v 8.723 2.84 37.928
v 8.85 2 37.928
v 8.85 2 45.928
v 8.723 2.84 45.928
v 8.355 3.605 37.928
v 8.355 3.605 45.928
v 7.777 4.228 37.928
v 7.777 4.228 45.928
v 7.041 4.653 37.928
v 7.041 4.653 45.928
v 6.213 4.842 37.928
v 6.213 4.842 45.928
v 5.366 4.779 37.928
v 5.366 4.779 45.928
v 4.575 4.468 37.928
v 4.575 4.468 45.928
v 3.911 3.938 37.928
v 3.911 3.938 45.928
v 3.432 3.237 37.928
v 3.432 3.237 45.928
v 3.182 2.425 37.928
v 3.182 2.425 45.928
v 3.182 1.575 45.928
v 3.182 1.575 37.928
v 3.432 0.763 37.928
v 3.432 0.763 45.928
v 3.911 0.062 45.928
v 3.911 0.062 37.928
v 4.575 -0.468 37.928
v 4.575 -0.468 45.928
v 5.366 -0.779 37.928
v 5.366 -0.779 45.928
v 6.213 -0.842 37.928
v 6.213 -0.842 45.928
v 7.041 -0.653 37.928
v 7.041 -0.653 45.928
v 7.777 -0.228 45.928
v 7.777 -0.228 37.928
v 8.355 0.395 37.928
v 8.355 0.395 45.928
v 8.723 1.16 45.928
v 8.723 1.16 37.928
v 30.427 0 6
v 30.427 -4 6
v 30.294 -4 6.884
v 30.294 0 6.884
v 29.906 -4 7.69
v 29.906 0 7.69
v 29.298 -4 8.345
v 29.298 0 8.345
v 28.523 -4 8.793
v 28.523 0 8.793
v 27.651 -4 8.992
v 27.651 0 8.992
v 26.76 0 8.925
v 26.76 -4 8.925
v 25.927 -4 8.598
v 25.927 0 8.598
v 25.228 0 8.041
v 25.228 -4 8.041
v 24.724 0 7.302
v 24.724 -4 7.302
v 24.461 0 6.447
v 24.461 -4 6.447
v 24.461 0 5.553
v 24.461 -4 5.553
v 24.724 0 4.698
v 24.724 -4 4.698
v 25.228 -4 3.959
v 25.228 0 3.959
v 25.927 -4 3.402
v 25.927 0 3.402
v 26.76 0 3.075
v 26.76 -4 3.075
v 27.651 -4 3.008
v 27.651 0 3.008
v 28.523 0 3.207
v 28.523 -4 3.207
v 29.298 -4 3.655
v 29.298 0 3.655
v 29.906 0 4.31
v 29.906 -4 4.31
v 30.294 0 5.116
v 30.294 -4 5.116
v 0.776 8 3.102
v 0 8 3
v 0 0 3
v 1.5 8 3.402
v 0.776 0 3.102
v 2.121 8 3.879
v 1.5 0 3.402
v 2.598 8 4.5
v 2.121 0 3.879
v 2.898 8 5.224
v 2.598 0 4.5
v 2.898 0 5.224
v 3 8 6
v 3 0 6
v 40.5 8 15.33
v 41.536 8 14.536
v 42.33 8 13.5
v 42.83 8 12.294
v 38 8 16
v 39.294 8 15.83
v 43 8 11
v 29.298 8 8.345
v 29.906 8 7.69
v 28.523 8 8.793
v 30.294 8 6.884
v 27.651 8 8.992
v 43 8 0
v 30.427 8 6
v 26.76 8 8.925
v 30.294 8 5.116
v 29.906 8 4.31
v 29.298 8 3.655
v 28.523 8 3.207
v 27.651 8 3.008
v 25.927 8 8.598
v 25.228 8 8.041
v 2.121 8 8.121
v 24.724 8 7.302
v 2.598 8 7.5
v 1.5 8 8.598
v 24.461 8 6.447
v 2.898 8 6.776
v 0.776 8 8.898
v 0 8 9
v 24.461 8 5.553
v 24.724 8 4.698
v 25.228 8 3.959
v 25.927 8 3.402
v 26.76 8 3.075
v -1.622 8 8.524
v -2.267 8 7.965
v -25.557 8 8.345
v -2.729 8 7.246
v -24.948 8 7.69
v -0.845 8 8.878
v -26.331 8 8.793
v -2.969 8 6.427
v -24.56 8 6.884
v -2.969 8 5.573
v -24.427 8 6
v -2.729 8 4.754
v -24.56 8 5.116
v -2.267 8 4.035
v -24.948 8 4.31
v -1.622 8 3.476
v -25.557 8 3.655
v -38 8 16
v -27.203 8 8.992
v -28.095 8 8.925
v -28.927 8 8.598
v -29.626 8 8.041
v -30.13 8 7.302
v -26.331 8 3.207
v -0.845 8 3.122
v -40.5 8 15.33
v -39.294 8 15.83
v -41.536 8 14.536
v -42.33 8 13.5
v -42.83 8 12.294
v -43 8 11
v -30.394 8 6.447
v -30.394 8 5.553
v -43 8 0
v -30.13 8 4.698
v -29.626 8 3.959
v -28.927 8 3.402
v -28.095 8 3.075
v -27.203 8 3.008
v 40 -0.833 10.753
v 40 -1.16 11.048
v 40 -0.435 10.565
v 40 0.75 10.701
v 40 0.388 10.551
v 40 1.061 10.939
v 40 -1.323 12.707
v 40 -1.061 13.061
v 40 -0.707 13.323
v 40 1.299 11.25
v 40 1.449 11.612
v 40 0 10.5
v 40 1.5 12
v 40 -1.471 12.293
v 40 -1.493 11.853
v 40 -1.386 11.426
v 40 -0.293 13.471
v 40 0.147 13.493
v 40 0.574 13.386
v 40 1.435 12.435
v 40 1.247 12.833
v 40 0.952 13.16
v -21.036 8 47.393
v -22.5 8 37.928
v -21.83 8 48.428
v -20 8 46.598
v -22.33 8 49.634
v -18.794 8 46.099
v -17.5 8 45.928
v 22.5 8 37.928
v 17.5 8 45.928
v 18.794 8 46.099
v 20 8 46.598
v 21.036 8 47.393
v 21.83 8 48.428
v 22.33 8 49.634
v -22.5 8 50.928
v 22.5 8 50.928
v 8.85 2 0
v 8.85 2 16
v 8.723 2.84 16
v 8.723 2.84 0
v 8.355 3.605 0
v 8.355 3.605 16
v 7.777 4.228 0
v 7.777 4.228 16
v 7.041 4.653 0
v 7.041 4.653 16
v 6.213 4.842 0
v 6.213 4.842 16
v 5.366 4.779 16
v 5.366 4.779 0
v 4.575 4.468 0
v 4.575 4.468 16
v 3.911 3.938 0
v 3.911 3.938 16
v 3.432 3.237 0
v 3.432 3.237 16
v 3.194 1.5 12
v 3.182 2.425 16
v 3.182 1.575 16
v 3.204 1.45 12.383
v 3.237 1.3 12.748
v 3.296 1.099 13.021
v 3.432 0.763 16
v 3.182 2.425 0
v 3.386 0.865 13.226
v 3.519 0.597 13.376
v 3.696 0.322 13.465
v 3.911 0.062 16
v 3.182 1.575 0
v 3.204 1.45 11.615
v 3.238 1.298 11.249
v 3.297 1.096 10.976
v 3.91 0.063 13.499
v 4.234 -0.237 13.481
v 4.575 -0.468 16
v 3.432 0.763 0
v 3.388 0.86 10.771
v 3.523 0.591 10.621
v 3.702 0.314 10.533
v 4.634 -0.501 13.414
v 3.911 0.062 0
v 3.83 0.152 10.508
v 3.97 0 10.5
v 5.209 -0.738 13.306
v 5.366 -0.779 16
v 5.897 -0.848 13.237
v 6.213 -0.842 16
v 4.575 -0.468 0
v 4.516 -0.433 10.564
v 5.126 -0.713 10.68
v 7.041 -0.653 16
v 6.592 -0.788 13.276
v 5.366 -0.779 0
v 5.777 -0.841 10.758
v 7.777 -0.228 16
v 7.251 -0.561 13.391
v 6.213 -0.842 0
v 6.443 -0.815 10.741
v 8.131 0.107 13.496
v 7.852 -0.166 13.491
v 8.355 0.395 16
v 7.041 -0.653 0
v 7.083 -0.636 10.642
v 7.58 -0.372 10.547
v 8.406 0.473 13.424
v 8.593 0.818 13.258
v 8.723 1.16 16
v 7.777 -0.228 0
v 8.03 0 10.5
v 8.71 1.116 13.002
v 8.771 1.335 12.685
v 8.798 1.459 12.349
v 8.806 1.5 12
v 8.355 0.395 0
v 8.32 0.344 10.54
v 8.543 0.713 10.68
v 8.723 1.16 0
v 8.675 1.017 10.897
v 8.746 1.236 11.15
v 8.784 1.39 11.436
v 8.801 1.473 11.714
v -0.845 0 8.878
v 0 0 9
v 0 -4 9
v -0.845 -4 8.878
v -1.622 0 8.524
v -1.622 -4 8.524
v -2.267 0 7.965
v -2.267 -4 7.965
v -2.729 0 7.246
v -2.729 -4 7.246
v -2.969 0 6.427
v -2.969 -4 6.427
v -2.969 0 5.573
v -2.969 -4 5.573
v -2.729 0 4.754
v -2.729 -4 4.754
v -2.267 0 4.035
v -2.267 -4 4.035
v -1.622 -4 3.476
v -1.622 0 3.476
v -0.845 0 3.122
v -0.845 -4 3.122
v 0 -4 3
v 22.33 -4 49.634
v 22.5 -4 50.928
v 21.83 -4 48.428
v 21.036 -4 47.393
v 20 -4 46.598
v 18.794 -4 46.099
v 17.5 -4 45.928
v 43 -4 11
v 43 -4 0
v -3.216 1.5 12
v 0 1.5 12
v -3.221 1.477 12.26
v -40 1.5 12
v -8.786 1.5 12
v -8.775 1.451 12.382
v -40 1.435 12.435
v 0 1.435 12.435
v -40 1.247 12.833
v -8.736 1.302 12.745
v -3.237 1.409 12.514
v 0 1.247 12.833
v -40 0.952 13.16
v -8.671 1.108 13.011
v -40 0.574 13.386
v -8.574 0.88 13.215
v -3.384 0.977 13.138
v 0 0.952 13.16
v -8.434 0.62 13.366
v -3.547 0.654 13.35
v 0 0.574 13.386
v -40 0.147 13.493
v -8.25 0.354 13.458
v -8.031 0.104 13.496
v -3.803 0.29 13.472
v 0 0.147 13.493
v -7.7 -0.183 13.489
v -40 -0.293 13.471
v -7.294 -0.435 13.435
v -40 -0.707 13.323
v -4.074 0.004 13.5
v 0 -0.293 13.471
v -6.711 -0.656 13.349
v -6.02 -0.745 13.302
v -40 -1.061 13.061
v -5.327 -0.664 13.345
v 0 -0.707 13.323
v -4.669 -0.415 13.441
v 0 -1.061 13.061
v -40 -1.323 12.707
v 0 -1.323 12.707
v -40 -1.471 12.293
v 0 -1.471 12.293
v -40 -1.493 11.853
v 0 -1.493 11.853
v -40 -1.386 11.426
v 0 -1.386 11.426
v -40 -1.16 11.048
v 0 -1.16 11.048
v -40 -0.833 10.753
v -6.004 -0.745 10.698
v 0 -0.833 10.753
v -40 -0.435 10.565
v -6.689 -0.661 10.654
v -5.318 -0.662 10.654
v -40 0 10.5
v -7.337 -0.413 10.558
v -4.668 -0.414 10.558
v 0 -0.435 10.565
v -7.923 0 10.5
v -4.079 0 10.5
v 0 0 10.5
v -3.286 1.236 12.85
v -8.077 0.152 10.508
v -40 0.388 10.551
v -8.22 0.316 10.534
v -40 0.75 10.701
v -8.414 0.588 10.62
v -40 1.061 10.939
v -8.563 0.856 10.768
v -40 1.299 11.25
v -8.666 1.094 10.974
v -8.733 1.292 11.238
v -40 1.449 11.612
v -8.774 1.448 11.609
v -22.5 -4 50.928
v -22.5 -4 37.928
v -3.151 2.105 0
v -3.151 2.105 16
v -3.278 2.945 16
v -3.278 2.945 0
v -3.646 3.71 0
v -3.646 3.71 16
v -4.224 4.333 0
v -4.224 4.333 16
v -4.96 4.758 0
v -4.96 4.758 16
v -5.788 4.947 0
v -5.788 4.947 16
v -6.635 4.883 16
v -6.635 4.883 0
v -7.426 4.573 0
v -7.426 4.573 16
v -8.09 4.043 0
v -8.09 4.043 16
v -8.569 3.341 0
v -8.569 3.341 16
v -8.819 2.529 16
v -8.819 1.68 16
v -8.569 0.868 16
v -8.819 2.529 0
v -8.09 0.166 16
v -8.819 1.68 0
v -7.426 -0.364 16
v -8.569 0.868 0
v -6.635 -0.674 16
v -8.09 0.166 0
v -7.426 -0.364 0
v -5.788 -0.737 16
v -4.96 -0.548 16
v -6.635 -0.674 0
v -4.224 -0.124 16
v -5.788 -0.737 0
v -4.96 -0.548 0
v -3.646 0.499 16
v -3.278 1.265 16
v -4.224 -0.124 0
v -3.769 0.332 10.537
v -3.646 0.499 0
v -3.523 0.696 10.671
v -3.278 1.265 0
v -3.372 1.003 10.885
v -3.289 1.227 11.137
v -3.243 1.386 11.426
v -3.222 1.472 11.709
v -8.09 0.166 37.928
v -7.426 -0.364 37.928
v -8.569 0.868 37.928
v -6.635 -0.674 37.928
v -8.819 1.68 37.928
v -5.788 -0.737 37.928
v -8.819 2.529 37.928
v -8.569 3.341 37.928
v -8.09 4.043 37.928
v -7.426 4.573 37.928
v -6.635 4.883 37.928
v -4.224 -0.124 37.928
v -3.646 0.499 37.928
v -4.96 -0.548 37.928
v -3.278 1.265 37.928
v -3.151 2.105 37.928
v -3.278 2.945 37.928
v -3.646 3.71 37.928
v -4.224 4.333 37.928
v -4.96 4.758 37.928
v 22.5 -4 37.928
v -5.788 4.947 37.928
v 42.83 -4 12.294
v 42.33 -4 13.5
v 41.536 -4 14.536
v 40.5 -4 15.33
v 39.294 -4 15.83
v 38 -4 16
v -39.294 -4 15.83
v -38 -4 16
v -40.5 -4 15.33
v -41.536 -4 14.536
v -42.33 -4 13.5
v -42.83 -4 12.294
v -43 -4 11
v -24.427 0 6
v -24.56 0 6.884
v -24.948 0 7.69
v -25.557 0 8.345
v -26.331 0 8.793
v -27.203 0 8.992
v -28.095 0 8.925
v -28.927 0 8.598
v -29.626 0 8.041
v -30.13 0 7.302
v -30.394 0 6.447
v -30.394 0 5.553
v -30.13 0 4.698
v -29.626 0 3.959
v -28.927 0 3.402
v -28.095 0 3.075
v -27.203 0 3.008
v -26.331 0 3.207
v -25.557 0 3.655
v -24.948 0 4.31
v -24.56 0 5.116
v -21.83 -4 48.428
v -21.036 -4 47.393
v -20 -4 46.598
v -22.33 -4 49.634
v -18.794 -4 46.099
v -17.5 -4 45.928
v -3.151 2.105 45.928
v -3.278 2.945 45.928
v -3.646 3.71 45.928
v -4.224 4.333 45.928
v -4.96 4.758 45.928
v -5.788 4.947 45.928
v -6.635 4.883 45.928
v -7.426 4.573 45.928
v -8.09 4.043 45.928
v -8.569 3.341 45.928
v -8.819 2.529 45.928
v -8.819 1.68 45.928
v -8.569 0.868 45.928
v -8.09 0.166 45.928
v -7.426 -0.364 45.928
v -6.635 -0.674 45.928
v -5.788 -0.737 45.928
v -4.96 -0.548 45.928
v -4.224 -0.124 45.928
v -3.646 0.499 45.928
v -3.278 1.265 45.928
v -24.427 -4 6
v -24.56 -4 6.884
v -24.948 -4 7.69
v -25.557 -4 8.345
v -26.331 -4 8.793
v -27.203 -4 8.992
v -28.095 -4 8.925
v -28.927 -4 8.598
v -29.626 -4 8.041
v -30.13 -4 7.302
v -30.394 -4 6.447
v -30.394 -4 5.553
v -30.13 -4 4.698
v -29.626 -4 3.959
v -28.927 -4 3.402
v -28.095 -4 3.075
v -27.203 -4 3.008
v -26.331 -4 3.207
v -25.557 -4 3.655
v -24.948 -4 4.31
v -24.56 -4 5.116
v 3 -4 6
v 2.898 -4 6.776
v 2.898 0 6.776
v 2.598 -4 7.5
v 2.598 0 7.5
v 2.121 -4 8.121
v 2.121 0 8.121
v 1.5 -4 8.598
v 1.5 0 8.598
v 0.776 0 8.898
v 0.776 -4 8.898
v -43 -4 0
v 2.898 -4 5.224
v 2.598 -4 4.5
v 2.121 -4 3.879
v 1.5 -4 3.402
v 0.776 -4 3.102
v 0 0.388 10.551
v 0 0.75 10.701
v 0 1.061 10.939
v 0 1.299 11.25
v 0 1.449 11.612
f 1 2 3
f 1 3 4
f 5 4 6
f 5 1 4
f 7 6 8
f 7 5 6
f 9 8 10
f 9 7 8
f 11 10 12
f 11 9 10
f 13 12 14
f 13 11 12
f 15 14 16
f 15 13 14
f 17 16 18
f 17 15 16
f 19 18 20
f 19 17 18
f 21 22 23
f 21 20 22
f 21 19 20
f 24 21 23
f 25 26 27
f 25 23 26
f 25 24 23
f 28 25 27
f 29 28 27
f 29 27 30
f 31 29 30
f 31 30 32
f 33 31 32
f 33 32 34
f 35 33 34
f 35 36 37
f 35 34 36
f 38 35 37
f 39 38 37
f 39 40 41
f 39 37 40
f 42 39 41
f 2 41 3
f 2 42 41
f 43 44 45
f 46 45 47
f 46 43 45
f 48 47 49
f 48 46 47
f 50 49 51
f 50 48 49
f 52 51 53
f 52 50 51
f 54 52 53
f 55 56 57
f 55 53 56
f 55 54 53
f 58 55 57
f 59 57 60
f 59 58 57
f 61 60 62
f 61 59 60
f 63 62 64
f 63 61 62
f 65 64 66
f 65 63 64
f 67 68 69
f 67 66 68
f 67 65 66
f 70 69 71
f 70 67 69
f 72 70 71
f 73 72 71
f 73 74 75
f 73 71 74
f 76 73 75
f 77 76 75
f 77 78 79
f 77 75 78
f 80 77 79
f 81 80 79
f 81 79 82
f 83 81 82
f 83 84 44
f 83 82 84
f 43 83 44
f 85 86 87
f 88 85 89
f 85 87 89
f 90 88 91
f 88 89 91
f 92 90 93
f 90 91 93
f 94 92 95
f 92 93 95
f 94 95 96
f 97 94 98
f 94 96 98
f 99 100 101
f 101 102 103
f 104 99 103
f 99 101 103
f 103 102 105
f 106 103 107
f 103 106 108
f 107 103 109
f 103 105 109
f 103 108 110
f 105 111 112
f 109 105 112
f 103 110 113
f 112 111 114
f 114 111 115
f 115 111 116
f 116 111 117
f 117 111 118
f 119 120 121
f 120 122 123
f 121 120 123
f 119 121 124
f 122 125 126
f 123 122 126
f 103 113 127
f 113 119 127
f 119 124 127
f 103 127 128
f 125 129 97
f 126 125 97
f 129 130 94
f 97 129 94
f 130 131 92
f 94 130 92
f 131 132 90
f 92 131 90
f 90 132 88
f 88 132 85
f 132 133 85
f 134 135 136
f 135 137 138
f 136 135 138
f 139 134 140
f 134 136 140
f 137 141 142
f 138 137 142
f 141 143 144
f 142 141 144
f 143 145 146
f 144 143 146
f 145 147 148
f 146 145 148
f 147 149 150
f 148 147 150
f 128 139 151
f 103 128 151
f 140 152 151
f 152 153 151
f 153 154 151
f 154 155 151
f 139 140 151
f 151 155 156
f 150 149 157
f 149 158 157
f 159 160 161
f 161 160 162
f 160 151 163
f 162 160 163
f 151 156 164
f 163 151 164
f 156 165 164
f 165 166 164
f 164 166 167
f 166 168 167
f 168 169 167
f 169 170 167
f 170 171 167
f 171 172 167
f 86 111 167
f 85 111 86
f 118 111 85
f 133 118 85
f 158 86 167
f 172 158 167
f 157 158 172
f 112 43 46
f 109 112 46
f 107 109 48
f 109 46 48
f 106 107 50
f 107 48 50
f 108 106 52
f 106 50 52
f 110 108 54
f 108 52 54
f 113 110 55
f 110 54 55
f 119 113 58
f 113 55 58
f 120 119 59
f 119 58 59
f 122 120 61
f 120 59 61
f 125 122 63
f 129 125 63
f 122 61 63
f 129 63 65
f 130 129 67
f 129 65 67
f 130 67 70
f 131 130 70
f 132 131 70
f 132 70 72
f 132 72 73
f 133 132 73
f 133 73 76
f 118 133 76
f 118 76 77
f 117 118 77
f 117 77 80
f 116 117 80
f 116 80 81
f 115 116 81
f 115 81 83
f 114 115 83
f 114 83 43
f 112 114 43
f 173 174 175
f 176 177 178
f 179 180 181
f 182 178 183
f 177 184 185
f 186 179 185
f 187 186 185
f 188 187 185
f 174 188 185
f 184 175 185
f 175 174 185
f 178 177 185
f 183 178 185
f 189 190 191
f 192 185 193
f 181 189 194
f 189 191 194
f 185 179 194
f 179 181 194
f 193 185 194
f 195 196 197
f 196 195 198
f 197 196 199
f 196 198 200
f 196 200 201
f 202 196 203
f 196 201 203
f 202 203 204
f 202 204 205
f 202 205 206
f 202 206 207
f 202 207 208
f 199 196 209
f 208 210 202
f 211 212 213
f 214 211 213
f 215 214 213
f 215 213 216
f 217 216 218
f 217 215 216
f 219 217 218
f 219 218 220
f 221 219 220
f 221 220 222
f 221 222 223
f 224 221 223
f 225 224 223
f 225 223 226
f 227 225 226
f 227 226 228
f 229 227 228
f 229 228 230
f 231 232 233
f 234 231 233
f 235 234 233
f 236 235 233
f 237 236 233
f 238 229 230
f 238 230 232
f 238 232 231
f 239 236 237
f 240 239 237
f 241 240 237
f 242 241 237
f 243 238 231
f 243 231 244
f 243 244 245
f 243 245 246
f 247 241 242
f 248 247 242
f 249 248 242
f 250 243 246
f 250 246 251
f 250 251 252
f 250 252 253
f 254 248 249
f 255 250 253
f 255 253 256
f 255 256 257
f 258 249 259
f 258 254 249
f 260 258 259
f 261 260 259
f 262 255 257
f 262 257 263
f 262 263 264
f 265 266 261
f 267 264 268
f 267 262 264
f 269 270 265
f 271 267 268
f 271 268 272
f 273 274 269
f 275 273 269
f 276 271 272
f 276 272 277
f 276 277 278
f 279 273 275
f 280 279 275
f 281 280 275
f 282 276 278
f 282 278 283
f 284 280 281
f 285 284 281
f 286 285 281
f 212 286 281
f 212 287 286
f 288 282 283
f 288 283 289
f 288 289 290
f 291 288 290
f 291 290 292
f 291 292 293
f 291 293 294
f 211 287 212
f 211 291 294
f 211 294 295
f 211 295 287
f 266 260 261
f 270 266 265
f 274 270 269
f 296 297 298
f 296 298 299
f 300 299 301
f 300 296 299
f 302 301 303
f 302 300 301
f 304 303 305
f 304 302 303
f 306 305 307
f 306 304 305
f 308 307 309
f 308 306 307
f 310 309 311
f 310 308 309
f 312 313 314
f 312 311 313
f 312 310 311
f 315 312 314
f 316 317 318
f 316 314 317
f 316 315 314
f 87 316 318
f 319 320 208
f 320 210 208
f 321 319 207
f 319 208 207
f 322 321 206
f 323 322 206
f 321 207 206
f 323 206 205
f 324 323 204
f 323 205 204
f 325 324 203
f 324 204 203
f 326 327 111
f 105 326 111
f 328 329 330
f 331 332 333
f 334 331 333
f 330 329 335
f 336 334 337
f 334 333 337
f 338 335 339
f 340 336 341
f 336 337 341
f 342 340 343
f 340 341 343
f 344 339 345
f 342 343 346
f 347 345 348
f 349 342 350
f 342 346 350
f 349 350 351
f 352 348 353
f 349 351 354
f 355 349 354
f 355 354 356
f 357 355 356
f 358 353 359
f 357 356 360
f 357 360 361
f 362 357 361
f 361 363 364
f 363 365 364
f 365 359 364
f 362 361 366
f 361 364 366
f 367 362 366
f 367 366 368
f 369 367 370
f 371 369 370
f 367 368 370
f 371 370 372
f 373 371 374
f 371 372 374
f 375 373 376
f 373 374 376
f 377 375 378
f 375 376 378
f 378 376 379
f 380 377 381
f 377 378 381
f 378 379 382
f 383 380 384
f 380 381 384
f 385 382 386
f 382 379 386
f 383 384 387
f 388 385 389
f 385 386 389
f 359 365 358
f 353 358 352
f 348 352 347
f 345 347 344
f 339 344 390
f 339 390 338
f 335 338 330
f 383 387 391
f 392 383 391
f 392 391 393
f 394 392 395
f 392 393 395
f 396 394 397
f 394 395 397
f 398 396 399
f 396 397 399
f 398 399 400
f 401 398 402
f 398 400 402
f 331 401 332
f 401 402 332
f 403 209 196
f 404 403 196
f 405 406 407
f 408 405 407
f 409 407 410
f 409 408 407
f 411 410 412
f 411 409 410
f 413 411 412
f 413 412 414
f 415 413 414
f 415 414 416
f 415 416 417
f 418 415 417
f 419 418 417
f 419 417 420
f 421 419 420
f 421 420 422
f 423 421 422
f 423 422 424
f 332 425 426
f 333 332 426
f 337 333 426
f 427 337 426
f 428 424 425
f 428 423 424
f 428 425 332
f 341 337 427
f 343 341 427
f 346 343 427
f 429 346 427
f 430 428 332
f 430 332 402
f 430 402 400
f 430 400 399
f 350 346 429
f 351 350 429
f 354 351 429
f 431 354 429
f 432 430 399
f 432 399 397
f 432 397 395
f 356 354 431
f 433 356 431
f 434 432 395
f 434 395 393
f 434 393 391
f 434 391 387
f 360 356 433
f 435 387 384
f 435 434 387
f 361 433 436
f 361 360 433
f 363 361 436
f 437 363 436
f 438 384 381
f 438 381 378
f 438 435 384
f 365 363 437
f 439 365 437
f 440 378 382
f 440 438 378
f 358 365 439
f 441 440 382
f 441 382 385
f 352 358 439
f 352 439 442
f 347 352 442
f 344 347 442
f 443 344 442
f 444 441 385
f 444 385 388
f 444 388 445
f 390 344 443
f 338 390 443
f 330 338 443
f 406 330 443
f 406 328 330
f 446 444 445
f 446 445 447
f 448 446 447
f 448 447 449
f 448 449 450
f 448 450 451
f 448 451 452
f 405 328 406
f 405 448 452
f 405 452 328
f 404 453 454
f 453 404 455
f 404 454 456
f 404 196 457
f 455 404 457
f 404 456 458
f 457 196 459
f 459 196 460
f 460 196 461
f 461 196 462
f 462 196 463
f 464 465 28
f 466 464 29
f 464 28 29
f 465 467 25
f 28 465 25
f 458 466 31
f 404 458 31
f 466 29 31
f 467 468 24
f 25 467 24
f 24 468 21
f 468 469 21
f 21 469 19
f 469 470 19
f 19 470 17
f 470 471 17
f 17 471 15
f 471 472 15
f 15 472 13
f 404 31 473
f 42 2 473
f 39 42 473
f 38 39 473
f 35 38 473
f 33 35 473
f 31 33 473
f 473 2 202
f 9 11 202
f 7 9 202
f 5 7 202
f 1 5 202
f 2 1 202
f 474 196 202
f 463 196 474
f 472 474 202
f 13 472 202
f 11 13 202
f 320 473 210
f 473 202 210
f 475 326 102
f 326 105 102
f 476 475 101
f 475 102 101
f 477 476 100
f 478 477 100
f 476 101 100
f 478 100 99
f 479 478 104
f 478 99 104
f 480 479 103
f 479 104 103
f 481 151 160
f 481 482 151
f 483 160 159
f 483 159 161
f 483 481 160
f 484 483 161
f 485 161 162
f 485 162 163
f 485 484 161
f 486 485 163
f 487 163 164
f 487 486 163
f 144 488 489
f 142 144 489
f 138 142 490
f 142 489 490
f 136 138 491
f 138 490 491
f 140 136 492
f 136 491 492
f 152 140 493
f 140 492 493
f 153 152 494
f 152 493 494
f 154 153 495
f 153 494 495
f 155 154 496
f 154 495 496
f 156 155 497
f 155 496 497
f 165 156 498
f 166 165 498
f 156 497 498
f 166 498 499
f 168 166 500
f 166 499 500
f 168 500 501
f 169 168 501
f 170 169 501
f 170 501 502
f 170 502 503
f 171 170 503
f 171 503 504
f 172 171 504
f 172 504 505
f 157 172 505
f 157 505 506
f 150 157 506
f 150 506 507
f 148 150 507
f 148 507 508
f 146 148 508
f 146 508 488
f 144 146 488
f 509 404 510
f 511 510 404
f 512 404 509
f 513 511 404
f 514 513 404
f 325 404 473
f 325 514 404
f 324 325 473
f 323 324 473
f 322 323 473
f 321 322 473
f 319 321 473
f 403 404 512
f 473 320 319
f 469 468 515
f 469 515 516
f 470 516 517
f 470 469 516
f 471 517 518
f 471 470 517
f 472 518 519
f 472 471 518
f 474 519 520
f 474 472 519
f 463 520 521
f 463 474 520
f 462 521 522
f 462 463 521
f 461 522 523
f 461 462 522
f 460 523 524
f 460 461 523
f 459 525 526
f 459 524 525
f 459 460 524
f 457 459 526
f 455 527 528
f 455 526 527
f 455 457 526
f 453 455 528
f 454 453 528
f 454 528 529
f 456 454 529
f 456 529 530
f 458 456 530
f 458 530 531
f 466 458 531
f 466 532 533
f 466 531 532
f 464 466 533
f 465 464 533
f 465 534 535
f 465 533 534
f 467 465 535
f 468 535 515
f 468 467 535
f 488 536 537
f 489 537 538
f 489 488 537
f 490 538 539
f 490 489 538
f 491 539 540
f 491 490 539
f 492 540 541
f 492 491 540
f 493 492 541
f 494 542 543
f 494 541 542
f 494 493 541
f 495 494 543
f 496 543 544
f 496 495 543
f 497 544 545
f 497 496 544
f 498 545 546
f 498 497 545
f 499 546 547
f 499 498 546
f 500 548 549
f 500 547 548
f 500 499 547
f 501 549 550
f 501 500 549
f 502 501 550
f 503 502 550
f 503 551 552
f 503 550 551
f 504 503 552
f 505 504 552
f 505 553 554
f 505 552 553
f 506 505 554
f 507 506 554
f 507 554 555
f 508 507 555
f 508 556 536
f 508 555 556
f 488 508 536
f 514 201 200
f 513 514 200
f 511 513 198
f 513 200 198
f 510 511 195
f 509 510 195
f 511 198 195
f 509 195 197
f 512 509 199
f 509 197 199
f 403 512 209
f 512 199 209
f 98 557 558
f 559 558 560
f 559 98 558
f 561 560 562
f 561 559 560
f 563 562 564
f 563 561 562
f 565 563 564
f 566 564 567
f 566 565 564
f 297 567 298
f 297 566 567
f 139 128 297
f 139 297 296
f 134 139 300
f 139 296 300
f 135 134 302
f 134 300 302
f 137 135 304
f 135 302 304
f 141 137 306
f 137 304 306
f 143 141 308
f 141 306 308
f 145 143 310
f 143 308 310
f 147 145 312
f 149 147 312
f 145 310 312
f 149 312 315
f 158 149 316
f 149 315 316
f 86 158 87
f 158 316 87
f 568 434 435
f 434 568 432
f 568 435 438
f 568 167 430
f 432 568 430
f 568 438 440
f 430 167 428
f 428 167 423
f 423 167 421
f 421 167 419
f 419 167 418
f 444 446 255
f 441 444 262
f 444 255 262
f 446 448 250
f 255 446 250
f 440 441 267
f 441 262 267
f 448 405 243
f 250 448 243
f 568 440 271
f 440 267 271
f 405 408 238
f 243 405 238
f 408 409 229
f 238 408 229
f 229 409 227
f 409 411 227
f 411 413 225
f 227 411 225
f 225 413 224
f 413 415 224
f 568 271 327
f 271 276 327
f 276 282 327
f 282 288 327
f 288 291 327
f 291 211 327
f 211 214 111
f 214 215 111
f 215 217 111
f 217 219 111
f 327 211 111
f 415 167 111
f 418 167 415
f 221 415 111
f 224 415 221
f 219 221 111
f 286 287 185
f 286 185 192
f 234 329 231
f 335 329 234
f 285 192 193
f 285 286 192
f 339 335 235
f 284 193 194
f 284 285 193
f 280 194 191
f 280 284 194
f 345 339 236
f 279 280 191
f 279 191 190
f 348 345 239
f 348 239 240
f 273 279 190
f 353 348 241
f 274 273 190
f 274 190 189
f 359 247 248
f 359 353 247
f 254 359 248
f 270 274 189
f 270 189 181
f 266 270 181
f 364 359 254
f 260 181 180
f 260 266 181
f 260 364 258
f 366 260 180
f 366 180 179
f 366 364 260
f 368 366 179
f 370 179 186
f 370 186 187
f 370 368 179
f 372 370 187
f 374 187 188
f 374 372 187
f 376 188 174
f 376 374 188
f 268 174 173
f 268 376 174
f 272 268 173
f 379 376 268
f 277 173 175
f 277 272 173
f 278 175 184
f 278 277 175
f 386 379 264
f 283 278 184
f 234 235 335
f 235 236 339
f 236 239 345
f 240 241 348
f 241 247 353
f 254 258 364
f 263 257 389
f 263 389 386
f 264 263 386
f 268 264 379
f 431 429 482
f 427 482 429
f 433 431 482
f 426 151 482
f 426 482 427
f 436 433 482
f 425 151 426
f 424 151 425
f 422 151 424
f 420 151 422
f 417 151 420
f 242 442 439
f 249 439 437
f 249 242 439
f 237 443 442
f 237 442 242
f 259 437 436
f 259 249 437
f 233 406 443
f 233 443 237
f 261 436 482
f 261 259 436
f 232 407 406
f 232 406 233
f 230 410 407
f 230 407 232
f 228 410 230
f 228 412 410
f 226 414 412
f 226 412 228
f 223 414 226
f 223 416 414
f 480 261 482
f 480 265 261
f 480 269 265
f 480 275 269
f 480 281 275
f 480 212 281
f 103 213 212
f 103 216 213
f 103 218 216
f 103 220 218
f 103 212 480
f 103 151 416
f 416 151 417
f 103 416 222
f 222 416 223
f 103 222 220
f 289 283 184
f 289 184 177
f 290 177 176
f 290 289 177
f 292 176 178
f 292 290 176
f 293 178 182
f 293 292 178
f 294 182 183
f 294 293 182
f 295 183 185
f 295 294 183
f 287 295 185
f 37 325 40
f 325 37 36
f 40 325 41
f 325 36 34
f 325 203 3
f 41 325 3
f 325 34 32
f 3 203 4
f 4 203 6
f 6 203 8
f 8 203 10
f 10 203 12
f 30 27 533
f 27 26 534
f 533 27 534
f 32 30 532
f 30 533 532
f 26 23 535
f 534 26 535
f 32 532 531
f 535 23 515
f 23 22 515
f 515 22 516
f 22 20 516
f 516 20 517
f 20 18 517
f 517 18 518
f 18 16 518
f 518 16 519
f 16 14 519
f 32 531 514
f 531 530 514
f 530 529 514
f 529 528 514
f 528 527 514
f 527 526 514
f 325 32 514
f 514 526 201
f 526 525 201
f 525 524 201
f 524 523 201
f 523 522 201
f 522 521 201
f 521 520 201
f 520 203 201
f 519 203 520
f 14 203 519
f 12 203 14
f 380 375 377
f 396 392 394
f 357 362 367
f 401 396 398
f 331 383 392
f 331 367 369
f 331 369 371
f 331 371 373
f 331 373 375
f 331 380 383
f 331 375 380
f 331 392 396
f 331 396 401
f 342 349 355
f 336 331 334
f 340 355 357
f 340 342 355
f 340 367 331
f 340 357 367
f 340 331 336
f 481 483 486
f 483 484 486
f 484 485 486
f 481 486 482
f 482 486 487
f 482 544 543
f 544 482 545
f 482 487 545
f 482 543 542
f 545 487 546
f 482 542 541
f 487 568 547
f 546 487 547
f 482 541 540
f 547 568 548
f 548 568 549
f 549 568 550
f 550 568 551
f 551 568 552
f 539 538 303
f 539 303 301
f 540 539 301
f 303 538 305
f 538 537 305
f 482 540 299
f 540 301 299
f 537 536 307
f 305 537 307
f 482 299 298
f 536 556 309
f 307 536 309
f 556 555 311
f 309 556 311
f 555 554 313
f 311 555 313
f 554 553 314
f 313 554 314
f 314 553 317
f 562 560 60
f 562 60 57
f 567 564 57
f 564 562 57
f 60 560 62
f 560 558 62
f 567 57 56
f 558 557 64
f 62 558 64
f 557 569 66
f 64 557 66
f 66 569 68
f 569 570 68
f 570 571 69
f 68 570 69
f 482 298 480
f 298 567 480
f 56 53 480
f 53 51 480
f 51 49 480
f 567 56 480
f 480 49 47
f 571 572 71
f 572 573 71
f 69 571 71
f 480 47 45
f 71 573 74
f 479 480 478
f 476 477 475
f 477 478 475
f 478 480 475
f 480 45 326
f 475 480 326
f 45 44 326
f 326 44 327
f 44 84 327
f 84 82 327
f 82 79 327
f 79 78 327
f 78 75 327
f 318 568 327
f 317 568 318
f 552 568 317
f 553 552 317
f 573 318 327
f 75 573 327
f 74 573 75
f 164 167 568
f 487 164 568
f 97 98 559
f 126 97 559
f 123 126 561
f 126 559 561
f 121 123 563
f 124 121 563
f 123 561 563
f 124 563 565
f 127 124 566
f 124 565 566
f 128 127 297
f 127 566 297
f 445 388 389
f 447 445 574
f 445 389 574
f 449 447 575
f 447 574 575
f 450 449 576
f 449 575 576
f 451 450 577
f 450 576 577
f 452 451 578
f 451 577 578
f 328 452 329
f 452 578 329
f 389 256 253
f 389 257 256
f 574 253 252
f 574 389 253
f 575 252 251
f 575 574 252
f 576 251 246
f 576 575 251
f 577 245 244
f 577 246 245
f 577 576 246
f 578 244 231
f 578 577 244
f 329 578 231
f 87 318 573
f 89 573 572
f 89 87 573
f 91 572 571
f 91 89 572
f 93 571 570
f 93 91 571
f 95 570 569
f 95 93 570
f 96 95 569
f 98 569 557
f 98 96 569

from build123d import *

# Parameters (mm, degrees)
F0_R          = 2.85
F1_DEPTH      = 16
F2_R          = 3
F3_DEPTH      = 12.5
F5_DEPTH      = 40
F7_DEPTH      = 8
F7_DEPTH_BACK = 4
F8_DEPTH      = 50.929265815
F9_R          = 5


# Not quite as in the source:
# - a feature names something its author has since deleted; it is built from what else it names


with BuildPart() as f1:
    # F0 (on Top) → F1 (new body)
    with BuildSketch(Plane.XY):
        Polygon((20.2244706452, -4), (35, -4), (43, -4), (43, 8), (35, 8), (20.2244706452, 8), (19.8490470648, 8), (-35, 8), (-43, 8), (-43, -4), (-35, -4), (-20.2244706452, -4), (-19.8490470648, -4), (19.8490470648, -4), align=None)
        with Locations((-6.0009112008, 2.1045637578)):
            Circle(F0_R, mode=Mode.SUBTRACT)
        with Locations((6, 2)):
            Circle(F0_R, mode=Mode.SUBTRACT)
    extrude(amount=F1_DEPTH)

    # F2 (on Front) → F3 (cut, symmetric)
    with BuildSketch(Plane.XZ):
        with Locations((-27.4271778762, 6)):
            Circle(F2_R)
        with Locations((27.4271778762, 6)):
            Circle(F2_R)
        with BuildLine():
            ThreePointArc((0, 9), (-3, 6), (0, 3))
            Line((0, 3), (0, 9))
        make_face()
        with BuildLine():
            Line((0, 9), (0, 3))
            ThreePointArc((0, 3), (2.1213203436, 3.8786796564), (3, 6))
            ThreePointArc((3, 6), (2.1213203436, 8.1213203436), (0, 9))
        make_face()
    extrude(amount=F3_DEPTH, both=True, mode=Mode.SUBTRACT)

    # F4 (on Right) → F5 (cut, symmetric)
    with BuildSketch(Plane.YZ):
        with BuildLine():
            ThreePointArc((0, 10.5), (1.0606601718, 10.9393398282), (1.5, 12))
            ThreePointArc((1.5, 12), (-1.0606601718, 13.0606601718), (0, 10.5))
        make_face()
    extrude(amount=F5_DEPTH, both=True, mode=Mode.SUBTRACT)

    # F9
    f9_edges = [f1.edges().sort_by_distance(p)[0] for p in [
        (-43, 2, 16),
        (43, 2, 16),
    ]]
    fillet(f9_edges, radius=F9_R)


with BuildPart() as f7:
    # F6 (on Front) → F7 (new body, two sides)
    with BuildSketch(Plane.XZ) as f7_sk:
        with BuildLine():
            Line((-22.5, 50.928265815), (-22.5, 37.928265815))
            Line((-22.5, 37.928265815), (22.5, 37.928265815))
            Line((22.5, 37.928265815), (22.5, 45.928265815))
            Line((22.5, 45.928265815), (22.5, 50.928265815))
            ThreePointArc((22.5, 50.928265815), (21.0355339059, 47.3927319091), (17.5, 45.928265815))
            Line((17.5, 45.928265815), (-17.5, 45.928265815))
            ThreePointArc((-17.5, 45.928265815), (-21.0355339059, 47.3927319091), (-22.5, 50.928265815))
        make_face()
    extrude(amount=-F7_DEPTH)
    extrude(f7_sk.sketch, amount=F7_DEPTH_BACK)

    # F0 (on Top) → F8 (cut, through all)
    with BuildSketch(Plane.XY):
        with Locations((-6.0009112008, 2.1045637578)):
            Circle(F0_R)
        with Locations((6, 2)):
            Circle(F0_R)
    extrude(amount=F8_DEPTH, mode=Mode.SUBTRACT)


solid = Compound([f1.part, f7.part])
